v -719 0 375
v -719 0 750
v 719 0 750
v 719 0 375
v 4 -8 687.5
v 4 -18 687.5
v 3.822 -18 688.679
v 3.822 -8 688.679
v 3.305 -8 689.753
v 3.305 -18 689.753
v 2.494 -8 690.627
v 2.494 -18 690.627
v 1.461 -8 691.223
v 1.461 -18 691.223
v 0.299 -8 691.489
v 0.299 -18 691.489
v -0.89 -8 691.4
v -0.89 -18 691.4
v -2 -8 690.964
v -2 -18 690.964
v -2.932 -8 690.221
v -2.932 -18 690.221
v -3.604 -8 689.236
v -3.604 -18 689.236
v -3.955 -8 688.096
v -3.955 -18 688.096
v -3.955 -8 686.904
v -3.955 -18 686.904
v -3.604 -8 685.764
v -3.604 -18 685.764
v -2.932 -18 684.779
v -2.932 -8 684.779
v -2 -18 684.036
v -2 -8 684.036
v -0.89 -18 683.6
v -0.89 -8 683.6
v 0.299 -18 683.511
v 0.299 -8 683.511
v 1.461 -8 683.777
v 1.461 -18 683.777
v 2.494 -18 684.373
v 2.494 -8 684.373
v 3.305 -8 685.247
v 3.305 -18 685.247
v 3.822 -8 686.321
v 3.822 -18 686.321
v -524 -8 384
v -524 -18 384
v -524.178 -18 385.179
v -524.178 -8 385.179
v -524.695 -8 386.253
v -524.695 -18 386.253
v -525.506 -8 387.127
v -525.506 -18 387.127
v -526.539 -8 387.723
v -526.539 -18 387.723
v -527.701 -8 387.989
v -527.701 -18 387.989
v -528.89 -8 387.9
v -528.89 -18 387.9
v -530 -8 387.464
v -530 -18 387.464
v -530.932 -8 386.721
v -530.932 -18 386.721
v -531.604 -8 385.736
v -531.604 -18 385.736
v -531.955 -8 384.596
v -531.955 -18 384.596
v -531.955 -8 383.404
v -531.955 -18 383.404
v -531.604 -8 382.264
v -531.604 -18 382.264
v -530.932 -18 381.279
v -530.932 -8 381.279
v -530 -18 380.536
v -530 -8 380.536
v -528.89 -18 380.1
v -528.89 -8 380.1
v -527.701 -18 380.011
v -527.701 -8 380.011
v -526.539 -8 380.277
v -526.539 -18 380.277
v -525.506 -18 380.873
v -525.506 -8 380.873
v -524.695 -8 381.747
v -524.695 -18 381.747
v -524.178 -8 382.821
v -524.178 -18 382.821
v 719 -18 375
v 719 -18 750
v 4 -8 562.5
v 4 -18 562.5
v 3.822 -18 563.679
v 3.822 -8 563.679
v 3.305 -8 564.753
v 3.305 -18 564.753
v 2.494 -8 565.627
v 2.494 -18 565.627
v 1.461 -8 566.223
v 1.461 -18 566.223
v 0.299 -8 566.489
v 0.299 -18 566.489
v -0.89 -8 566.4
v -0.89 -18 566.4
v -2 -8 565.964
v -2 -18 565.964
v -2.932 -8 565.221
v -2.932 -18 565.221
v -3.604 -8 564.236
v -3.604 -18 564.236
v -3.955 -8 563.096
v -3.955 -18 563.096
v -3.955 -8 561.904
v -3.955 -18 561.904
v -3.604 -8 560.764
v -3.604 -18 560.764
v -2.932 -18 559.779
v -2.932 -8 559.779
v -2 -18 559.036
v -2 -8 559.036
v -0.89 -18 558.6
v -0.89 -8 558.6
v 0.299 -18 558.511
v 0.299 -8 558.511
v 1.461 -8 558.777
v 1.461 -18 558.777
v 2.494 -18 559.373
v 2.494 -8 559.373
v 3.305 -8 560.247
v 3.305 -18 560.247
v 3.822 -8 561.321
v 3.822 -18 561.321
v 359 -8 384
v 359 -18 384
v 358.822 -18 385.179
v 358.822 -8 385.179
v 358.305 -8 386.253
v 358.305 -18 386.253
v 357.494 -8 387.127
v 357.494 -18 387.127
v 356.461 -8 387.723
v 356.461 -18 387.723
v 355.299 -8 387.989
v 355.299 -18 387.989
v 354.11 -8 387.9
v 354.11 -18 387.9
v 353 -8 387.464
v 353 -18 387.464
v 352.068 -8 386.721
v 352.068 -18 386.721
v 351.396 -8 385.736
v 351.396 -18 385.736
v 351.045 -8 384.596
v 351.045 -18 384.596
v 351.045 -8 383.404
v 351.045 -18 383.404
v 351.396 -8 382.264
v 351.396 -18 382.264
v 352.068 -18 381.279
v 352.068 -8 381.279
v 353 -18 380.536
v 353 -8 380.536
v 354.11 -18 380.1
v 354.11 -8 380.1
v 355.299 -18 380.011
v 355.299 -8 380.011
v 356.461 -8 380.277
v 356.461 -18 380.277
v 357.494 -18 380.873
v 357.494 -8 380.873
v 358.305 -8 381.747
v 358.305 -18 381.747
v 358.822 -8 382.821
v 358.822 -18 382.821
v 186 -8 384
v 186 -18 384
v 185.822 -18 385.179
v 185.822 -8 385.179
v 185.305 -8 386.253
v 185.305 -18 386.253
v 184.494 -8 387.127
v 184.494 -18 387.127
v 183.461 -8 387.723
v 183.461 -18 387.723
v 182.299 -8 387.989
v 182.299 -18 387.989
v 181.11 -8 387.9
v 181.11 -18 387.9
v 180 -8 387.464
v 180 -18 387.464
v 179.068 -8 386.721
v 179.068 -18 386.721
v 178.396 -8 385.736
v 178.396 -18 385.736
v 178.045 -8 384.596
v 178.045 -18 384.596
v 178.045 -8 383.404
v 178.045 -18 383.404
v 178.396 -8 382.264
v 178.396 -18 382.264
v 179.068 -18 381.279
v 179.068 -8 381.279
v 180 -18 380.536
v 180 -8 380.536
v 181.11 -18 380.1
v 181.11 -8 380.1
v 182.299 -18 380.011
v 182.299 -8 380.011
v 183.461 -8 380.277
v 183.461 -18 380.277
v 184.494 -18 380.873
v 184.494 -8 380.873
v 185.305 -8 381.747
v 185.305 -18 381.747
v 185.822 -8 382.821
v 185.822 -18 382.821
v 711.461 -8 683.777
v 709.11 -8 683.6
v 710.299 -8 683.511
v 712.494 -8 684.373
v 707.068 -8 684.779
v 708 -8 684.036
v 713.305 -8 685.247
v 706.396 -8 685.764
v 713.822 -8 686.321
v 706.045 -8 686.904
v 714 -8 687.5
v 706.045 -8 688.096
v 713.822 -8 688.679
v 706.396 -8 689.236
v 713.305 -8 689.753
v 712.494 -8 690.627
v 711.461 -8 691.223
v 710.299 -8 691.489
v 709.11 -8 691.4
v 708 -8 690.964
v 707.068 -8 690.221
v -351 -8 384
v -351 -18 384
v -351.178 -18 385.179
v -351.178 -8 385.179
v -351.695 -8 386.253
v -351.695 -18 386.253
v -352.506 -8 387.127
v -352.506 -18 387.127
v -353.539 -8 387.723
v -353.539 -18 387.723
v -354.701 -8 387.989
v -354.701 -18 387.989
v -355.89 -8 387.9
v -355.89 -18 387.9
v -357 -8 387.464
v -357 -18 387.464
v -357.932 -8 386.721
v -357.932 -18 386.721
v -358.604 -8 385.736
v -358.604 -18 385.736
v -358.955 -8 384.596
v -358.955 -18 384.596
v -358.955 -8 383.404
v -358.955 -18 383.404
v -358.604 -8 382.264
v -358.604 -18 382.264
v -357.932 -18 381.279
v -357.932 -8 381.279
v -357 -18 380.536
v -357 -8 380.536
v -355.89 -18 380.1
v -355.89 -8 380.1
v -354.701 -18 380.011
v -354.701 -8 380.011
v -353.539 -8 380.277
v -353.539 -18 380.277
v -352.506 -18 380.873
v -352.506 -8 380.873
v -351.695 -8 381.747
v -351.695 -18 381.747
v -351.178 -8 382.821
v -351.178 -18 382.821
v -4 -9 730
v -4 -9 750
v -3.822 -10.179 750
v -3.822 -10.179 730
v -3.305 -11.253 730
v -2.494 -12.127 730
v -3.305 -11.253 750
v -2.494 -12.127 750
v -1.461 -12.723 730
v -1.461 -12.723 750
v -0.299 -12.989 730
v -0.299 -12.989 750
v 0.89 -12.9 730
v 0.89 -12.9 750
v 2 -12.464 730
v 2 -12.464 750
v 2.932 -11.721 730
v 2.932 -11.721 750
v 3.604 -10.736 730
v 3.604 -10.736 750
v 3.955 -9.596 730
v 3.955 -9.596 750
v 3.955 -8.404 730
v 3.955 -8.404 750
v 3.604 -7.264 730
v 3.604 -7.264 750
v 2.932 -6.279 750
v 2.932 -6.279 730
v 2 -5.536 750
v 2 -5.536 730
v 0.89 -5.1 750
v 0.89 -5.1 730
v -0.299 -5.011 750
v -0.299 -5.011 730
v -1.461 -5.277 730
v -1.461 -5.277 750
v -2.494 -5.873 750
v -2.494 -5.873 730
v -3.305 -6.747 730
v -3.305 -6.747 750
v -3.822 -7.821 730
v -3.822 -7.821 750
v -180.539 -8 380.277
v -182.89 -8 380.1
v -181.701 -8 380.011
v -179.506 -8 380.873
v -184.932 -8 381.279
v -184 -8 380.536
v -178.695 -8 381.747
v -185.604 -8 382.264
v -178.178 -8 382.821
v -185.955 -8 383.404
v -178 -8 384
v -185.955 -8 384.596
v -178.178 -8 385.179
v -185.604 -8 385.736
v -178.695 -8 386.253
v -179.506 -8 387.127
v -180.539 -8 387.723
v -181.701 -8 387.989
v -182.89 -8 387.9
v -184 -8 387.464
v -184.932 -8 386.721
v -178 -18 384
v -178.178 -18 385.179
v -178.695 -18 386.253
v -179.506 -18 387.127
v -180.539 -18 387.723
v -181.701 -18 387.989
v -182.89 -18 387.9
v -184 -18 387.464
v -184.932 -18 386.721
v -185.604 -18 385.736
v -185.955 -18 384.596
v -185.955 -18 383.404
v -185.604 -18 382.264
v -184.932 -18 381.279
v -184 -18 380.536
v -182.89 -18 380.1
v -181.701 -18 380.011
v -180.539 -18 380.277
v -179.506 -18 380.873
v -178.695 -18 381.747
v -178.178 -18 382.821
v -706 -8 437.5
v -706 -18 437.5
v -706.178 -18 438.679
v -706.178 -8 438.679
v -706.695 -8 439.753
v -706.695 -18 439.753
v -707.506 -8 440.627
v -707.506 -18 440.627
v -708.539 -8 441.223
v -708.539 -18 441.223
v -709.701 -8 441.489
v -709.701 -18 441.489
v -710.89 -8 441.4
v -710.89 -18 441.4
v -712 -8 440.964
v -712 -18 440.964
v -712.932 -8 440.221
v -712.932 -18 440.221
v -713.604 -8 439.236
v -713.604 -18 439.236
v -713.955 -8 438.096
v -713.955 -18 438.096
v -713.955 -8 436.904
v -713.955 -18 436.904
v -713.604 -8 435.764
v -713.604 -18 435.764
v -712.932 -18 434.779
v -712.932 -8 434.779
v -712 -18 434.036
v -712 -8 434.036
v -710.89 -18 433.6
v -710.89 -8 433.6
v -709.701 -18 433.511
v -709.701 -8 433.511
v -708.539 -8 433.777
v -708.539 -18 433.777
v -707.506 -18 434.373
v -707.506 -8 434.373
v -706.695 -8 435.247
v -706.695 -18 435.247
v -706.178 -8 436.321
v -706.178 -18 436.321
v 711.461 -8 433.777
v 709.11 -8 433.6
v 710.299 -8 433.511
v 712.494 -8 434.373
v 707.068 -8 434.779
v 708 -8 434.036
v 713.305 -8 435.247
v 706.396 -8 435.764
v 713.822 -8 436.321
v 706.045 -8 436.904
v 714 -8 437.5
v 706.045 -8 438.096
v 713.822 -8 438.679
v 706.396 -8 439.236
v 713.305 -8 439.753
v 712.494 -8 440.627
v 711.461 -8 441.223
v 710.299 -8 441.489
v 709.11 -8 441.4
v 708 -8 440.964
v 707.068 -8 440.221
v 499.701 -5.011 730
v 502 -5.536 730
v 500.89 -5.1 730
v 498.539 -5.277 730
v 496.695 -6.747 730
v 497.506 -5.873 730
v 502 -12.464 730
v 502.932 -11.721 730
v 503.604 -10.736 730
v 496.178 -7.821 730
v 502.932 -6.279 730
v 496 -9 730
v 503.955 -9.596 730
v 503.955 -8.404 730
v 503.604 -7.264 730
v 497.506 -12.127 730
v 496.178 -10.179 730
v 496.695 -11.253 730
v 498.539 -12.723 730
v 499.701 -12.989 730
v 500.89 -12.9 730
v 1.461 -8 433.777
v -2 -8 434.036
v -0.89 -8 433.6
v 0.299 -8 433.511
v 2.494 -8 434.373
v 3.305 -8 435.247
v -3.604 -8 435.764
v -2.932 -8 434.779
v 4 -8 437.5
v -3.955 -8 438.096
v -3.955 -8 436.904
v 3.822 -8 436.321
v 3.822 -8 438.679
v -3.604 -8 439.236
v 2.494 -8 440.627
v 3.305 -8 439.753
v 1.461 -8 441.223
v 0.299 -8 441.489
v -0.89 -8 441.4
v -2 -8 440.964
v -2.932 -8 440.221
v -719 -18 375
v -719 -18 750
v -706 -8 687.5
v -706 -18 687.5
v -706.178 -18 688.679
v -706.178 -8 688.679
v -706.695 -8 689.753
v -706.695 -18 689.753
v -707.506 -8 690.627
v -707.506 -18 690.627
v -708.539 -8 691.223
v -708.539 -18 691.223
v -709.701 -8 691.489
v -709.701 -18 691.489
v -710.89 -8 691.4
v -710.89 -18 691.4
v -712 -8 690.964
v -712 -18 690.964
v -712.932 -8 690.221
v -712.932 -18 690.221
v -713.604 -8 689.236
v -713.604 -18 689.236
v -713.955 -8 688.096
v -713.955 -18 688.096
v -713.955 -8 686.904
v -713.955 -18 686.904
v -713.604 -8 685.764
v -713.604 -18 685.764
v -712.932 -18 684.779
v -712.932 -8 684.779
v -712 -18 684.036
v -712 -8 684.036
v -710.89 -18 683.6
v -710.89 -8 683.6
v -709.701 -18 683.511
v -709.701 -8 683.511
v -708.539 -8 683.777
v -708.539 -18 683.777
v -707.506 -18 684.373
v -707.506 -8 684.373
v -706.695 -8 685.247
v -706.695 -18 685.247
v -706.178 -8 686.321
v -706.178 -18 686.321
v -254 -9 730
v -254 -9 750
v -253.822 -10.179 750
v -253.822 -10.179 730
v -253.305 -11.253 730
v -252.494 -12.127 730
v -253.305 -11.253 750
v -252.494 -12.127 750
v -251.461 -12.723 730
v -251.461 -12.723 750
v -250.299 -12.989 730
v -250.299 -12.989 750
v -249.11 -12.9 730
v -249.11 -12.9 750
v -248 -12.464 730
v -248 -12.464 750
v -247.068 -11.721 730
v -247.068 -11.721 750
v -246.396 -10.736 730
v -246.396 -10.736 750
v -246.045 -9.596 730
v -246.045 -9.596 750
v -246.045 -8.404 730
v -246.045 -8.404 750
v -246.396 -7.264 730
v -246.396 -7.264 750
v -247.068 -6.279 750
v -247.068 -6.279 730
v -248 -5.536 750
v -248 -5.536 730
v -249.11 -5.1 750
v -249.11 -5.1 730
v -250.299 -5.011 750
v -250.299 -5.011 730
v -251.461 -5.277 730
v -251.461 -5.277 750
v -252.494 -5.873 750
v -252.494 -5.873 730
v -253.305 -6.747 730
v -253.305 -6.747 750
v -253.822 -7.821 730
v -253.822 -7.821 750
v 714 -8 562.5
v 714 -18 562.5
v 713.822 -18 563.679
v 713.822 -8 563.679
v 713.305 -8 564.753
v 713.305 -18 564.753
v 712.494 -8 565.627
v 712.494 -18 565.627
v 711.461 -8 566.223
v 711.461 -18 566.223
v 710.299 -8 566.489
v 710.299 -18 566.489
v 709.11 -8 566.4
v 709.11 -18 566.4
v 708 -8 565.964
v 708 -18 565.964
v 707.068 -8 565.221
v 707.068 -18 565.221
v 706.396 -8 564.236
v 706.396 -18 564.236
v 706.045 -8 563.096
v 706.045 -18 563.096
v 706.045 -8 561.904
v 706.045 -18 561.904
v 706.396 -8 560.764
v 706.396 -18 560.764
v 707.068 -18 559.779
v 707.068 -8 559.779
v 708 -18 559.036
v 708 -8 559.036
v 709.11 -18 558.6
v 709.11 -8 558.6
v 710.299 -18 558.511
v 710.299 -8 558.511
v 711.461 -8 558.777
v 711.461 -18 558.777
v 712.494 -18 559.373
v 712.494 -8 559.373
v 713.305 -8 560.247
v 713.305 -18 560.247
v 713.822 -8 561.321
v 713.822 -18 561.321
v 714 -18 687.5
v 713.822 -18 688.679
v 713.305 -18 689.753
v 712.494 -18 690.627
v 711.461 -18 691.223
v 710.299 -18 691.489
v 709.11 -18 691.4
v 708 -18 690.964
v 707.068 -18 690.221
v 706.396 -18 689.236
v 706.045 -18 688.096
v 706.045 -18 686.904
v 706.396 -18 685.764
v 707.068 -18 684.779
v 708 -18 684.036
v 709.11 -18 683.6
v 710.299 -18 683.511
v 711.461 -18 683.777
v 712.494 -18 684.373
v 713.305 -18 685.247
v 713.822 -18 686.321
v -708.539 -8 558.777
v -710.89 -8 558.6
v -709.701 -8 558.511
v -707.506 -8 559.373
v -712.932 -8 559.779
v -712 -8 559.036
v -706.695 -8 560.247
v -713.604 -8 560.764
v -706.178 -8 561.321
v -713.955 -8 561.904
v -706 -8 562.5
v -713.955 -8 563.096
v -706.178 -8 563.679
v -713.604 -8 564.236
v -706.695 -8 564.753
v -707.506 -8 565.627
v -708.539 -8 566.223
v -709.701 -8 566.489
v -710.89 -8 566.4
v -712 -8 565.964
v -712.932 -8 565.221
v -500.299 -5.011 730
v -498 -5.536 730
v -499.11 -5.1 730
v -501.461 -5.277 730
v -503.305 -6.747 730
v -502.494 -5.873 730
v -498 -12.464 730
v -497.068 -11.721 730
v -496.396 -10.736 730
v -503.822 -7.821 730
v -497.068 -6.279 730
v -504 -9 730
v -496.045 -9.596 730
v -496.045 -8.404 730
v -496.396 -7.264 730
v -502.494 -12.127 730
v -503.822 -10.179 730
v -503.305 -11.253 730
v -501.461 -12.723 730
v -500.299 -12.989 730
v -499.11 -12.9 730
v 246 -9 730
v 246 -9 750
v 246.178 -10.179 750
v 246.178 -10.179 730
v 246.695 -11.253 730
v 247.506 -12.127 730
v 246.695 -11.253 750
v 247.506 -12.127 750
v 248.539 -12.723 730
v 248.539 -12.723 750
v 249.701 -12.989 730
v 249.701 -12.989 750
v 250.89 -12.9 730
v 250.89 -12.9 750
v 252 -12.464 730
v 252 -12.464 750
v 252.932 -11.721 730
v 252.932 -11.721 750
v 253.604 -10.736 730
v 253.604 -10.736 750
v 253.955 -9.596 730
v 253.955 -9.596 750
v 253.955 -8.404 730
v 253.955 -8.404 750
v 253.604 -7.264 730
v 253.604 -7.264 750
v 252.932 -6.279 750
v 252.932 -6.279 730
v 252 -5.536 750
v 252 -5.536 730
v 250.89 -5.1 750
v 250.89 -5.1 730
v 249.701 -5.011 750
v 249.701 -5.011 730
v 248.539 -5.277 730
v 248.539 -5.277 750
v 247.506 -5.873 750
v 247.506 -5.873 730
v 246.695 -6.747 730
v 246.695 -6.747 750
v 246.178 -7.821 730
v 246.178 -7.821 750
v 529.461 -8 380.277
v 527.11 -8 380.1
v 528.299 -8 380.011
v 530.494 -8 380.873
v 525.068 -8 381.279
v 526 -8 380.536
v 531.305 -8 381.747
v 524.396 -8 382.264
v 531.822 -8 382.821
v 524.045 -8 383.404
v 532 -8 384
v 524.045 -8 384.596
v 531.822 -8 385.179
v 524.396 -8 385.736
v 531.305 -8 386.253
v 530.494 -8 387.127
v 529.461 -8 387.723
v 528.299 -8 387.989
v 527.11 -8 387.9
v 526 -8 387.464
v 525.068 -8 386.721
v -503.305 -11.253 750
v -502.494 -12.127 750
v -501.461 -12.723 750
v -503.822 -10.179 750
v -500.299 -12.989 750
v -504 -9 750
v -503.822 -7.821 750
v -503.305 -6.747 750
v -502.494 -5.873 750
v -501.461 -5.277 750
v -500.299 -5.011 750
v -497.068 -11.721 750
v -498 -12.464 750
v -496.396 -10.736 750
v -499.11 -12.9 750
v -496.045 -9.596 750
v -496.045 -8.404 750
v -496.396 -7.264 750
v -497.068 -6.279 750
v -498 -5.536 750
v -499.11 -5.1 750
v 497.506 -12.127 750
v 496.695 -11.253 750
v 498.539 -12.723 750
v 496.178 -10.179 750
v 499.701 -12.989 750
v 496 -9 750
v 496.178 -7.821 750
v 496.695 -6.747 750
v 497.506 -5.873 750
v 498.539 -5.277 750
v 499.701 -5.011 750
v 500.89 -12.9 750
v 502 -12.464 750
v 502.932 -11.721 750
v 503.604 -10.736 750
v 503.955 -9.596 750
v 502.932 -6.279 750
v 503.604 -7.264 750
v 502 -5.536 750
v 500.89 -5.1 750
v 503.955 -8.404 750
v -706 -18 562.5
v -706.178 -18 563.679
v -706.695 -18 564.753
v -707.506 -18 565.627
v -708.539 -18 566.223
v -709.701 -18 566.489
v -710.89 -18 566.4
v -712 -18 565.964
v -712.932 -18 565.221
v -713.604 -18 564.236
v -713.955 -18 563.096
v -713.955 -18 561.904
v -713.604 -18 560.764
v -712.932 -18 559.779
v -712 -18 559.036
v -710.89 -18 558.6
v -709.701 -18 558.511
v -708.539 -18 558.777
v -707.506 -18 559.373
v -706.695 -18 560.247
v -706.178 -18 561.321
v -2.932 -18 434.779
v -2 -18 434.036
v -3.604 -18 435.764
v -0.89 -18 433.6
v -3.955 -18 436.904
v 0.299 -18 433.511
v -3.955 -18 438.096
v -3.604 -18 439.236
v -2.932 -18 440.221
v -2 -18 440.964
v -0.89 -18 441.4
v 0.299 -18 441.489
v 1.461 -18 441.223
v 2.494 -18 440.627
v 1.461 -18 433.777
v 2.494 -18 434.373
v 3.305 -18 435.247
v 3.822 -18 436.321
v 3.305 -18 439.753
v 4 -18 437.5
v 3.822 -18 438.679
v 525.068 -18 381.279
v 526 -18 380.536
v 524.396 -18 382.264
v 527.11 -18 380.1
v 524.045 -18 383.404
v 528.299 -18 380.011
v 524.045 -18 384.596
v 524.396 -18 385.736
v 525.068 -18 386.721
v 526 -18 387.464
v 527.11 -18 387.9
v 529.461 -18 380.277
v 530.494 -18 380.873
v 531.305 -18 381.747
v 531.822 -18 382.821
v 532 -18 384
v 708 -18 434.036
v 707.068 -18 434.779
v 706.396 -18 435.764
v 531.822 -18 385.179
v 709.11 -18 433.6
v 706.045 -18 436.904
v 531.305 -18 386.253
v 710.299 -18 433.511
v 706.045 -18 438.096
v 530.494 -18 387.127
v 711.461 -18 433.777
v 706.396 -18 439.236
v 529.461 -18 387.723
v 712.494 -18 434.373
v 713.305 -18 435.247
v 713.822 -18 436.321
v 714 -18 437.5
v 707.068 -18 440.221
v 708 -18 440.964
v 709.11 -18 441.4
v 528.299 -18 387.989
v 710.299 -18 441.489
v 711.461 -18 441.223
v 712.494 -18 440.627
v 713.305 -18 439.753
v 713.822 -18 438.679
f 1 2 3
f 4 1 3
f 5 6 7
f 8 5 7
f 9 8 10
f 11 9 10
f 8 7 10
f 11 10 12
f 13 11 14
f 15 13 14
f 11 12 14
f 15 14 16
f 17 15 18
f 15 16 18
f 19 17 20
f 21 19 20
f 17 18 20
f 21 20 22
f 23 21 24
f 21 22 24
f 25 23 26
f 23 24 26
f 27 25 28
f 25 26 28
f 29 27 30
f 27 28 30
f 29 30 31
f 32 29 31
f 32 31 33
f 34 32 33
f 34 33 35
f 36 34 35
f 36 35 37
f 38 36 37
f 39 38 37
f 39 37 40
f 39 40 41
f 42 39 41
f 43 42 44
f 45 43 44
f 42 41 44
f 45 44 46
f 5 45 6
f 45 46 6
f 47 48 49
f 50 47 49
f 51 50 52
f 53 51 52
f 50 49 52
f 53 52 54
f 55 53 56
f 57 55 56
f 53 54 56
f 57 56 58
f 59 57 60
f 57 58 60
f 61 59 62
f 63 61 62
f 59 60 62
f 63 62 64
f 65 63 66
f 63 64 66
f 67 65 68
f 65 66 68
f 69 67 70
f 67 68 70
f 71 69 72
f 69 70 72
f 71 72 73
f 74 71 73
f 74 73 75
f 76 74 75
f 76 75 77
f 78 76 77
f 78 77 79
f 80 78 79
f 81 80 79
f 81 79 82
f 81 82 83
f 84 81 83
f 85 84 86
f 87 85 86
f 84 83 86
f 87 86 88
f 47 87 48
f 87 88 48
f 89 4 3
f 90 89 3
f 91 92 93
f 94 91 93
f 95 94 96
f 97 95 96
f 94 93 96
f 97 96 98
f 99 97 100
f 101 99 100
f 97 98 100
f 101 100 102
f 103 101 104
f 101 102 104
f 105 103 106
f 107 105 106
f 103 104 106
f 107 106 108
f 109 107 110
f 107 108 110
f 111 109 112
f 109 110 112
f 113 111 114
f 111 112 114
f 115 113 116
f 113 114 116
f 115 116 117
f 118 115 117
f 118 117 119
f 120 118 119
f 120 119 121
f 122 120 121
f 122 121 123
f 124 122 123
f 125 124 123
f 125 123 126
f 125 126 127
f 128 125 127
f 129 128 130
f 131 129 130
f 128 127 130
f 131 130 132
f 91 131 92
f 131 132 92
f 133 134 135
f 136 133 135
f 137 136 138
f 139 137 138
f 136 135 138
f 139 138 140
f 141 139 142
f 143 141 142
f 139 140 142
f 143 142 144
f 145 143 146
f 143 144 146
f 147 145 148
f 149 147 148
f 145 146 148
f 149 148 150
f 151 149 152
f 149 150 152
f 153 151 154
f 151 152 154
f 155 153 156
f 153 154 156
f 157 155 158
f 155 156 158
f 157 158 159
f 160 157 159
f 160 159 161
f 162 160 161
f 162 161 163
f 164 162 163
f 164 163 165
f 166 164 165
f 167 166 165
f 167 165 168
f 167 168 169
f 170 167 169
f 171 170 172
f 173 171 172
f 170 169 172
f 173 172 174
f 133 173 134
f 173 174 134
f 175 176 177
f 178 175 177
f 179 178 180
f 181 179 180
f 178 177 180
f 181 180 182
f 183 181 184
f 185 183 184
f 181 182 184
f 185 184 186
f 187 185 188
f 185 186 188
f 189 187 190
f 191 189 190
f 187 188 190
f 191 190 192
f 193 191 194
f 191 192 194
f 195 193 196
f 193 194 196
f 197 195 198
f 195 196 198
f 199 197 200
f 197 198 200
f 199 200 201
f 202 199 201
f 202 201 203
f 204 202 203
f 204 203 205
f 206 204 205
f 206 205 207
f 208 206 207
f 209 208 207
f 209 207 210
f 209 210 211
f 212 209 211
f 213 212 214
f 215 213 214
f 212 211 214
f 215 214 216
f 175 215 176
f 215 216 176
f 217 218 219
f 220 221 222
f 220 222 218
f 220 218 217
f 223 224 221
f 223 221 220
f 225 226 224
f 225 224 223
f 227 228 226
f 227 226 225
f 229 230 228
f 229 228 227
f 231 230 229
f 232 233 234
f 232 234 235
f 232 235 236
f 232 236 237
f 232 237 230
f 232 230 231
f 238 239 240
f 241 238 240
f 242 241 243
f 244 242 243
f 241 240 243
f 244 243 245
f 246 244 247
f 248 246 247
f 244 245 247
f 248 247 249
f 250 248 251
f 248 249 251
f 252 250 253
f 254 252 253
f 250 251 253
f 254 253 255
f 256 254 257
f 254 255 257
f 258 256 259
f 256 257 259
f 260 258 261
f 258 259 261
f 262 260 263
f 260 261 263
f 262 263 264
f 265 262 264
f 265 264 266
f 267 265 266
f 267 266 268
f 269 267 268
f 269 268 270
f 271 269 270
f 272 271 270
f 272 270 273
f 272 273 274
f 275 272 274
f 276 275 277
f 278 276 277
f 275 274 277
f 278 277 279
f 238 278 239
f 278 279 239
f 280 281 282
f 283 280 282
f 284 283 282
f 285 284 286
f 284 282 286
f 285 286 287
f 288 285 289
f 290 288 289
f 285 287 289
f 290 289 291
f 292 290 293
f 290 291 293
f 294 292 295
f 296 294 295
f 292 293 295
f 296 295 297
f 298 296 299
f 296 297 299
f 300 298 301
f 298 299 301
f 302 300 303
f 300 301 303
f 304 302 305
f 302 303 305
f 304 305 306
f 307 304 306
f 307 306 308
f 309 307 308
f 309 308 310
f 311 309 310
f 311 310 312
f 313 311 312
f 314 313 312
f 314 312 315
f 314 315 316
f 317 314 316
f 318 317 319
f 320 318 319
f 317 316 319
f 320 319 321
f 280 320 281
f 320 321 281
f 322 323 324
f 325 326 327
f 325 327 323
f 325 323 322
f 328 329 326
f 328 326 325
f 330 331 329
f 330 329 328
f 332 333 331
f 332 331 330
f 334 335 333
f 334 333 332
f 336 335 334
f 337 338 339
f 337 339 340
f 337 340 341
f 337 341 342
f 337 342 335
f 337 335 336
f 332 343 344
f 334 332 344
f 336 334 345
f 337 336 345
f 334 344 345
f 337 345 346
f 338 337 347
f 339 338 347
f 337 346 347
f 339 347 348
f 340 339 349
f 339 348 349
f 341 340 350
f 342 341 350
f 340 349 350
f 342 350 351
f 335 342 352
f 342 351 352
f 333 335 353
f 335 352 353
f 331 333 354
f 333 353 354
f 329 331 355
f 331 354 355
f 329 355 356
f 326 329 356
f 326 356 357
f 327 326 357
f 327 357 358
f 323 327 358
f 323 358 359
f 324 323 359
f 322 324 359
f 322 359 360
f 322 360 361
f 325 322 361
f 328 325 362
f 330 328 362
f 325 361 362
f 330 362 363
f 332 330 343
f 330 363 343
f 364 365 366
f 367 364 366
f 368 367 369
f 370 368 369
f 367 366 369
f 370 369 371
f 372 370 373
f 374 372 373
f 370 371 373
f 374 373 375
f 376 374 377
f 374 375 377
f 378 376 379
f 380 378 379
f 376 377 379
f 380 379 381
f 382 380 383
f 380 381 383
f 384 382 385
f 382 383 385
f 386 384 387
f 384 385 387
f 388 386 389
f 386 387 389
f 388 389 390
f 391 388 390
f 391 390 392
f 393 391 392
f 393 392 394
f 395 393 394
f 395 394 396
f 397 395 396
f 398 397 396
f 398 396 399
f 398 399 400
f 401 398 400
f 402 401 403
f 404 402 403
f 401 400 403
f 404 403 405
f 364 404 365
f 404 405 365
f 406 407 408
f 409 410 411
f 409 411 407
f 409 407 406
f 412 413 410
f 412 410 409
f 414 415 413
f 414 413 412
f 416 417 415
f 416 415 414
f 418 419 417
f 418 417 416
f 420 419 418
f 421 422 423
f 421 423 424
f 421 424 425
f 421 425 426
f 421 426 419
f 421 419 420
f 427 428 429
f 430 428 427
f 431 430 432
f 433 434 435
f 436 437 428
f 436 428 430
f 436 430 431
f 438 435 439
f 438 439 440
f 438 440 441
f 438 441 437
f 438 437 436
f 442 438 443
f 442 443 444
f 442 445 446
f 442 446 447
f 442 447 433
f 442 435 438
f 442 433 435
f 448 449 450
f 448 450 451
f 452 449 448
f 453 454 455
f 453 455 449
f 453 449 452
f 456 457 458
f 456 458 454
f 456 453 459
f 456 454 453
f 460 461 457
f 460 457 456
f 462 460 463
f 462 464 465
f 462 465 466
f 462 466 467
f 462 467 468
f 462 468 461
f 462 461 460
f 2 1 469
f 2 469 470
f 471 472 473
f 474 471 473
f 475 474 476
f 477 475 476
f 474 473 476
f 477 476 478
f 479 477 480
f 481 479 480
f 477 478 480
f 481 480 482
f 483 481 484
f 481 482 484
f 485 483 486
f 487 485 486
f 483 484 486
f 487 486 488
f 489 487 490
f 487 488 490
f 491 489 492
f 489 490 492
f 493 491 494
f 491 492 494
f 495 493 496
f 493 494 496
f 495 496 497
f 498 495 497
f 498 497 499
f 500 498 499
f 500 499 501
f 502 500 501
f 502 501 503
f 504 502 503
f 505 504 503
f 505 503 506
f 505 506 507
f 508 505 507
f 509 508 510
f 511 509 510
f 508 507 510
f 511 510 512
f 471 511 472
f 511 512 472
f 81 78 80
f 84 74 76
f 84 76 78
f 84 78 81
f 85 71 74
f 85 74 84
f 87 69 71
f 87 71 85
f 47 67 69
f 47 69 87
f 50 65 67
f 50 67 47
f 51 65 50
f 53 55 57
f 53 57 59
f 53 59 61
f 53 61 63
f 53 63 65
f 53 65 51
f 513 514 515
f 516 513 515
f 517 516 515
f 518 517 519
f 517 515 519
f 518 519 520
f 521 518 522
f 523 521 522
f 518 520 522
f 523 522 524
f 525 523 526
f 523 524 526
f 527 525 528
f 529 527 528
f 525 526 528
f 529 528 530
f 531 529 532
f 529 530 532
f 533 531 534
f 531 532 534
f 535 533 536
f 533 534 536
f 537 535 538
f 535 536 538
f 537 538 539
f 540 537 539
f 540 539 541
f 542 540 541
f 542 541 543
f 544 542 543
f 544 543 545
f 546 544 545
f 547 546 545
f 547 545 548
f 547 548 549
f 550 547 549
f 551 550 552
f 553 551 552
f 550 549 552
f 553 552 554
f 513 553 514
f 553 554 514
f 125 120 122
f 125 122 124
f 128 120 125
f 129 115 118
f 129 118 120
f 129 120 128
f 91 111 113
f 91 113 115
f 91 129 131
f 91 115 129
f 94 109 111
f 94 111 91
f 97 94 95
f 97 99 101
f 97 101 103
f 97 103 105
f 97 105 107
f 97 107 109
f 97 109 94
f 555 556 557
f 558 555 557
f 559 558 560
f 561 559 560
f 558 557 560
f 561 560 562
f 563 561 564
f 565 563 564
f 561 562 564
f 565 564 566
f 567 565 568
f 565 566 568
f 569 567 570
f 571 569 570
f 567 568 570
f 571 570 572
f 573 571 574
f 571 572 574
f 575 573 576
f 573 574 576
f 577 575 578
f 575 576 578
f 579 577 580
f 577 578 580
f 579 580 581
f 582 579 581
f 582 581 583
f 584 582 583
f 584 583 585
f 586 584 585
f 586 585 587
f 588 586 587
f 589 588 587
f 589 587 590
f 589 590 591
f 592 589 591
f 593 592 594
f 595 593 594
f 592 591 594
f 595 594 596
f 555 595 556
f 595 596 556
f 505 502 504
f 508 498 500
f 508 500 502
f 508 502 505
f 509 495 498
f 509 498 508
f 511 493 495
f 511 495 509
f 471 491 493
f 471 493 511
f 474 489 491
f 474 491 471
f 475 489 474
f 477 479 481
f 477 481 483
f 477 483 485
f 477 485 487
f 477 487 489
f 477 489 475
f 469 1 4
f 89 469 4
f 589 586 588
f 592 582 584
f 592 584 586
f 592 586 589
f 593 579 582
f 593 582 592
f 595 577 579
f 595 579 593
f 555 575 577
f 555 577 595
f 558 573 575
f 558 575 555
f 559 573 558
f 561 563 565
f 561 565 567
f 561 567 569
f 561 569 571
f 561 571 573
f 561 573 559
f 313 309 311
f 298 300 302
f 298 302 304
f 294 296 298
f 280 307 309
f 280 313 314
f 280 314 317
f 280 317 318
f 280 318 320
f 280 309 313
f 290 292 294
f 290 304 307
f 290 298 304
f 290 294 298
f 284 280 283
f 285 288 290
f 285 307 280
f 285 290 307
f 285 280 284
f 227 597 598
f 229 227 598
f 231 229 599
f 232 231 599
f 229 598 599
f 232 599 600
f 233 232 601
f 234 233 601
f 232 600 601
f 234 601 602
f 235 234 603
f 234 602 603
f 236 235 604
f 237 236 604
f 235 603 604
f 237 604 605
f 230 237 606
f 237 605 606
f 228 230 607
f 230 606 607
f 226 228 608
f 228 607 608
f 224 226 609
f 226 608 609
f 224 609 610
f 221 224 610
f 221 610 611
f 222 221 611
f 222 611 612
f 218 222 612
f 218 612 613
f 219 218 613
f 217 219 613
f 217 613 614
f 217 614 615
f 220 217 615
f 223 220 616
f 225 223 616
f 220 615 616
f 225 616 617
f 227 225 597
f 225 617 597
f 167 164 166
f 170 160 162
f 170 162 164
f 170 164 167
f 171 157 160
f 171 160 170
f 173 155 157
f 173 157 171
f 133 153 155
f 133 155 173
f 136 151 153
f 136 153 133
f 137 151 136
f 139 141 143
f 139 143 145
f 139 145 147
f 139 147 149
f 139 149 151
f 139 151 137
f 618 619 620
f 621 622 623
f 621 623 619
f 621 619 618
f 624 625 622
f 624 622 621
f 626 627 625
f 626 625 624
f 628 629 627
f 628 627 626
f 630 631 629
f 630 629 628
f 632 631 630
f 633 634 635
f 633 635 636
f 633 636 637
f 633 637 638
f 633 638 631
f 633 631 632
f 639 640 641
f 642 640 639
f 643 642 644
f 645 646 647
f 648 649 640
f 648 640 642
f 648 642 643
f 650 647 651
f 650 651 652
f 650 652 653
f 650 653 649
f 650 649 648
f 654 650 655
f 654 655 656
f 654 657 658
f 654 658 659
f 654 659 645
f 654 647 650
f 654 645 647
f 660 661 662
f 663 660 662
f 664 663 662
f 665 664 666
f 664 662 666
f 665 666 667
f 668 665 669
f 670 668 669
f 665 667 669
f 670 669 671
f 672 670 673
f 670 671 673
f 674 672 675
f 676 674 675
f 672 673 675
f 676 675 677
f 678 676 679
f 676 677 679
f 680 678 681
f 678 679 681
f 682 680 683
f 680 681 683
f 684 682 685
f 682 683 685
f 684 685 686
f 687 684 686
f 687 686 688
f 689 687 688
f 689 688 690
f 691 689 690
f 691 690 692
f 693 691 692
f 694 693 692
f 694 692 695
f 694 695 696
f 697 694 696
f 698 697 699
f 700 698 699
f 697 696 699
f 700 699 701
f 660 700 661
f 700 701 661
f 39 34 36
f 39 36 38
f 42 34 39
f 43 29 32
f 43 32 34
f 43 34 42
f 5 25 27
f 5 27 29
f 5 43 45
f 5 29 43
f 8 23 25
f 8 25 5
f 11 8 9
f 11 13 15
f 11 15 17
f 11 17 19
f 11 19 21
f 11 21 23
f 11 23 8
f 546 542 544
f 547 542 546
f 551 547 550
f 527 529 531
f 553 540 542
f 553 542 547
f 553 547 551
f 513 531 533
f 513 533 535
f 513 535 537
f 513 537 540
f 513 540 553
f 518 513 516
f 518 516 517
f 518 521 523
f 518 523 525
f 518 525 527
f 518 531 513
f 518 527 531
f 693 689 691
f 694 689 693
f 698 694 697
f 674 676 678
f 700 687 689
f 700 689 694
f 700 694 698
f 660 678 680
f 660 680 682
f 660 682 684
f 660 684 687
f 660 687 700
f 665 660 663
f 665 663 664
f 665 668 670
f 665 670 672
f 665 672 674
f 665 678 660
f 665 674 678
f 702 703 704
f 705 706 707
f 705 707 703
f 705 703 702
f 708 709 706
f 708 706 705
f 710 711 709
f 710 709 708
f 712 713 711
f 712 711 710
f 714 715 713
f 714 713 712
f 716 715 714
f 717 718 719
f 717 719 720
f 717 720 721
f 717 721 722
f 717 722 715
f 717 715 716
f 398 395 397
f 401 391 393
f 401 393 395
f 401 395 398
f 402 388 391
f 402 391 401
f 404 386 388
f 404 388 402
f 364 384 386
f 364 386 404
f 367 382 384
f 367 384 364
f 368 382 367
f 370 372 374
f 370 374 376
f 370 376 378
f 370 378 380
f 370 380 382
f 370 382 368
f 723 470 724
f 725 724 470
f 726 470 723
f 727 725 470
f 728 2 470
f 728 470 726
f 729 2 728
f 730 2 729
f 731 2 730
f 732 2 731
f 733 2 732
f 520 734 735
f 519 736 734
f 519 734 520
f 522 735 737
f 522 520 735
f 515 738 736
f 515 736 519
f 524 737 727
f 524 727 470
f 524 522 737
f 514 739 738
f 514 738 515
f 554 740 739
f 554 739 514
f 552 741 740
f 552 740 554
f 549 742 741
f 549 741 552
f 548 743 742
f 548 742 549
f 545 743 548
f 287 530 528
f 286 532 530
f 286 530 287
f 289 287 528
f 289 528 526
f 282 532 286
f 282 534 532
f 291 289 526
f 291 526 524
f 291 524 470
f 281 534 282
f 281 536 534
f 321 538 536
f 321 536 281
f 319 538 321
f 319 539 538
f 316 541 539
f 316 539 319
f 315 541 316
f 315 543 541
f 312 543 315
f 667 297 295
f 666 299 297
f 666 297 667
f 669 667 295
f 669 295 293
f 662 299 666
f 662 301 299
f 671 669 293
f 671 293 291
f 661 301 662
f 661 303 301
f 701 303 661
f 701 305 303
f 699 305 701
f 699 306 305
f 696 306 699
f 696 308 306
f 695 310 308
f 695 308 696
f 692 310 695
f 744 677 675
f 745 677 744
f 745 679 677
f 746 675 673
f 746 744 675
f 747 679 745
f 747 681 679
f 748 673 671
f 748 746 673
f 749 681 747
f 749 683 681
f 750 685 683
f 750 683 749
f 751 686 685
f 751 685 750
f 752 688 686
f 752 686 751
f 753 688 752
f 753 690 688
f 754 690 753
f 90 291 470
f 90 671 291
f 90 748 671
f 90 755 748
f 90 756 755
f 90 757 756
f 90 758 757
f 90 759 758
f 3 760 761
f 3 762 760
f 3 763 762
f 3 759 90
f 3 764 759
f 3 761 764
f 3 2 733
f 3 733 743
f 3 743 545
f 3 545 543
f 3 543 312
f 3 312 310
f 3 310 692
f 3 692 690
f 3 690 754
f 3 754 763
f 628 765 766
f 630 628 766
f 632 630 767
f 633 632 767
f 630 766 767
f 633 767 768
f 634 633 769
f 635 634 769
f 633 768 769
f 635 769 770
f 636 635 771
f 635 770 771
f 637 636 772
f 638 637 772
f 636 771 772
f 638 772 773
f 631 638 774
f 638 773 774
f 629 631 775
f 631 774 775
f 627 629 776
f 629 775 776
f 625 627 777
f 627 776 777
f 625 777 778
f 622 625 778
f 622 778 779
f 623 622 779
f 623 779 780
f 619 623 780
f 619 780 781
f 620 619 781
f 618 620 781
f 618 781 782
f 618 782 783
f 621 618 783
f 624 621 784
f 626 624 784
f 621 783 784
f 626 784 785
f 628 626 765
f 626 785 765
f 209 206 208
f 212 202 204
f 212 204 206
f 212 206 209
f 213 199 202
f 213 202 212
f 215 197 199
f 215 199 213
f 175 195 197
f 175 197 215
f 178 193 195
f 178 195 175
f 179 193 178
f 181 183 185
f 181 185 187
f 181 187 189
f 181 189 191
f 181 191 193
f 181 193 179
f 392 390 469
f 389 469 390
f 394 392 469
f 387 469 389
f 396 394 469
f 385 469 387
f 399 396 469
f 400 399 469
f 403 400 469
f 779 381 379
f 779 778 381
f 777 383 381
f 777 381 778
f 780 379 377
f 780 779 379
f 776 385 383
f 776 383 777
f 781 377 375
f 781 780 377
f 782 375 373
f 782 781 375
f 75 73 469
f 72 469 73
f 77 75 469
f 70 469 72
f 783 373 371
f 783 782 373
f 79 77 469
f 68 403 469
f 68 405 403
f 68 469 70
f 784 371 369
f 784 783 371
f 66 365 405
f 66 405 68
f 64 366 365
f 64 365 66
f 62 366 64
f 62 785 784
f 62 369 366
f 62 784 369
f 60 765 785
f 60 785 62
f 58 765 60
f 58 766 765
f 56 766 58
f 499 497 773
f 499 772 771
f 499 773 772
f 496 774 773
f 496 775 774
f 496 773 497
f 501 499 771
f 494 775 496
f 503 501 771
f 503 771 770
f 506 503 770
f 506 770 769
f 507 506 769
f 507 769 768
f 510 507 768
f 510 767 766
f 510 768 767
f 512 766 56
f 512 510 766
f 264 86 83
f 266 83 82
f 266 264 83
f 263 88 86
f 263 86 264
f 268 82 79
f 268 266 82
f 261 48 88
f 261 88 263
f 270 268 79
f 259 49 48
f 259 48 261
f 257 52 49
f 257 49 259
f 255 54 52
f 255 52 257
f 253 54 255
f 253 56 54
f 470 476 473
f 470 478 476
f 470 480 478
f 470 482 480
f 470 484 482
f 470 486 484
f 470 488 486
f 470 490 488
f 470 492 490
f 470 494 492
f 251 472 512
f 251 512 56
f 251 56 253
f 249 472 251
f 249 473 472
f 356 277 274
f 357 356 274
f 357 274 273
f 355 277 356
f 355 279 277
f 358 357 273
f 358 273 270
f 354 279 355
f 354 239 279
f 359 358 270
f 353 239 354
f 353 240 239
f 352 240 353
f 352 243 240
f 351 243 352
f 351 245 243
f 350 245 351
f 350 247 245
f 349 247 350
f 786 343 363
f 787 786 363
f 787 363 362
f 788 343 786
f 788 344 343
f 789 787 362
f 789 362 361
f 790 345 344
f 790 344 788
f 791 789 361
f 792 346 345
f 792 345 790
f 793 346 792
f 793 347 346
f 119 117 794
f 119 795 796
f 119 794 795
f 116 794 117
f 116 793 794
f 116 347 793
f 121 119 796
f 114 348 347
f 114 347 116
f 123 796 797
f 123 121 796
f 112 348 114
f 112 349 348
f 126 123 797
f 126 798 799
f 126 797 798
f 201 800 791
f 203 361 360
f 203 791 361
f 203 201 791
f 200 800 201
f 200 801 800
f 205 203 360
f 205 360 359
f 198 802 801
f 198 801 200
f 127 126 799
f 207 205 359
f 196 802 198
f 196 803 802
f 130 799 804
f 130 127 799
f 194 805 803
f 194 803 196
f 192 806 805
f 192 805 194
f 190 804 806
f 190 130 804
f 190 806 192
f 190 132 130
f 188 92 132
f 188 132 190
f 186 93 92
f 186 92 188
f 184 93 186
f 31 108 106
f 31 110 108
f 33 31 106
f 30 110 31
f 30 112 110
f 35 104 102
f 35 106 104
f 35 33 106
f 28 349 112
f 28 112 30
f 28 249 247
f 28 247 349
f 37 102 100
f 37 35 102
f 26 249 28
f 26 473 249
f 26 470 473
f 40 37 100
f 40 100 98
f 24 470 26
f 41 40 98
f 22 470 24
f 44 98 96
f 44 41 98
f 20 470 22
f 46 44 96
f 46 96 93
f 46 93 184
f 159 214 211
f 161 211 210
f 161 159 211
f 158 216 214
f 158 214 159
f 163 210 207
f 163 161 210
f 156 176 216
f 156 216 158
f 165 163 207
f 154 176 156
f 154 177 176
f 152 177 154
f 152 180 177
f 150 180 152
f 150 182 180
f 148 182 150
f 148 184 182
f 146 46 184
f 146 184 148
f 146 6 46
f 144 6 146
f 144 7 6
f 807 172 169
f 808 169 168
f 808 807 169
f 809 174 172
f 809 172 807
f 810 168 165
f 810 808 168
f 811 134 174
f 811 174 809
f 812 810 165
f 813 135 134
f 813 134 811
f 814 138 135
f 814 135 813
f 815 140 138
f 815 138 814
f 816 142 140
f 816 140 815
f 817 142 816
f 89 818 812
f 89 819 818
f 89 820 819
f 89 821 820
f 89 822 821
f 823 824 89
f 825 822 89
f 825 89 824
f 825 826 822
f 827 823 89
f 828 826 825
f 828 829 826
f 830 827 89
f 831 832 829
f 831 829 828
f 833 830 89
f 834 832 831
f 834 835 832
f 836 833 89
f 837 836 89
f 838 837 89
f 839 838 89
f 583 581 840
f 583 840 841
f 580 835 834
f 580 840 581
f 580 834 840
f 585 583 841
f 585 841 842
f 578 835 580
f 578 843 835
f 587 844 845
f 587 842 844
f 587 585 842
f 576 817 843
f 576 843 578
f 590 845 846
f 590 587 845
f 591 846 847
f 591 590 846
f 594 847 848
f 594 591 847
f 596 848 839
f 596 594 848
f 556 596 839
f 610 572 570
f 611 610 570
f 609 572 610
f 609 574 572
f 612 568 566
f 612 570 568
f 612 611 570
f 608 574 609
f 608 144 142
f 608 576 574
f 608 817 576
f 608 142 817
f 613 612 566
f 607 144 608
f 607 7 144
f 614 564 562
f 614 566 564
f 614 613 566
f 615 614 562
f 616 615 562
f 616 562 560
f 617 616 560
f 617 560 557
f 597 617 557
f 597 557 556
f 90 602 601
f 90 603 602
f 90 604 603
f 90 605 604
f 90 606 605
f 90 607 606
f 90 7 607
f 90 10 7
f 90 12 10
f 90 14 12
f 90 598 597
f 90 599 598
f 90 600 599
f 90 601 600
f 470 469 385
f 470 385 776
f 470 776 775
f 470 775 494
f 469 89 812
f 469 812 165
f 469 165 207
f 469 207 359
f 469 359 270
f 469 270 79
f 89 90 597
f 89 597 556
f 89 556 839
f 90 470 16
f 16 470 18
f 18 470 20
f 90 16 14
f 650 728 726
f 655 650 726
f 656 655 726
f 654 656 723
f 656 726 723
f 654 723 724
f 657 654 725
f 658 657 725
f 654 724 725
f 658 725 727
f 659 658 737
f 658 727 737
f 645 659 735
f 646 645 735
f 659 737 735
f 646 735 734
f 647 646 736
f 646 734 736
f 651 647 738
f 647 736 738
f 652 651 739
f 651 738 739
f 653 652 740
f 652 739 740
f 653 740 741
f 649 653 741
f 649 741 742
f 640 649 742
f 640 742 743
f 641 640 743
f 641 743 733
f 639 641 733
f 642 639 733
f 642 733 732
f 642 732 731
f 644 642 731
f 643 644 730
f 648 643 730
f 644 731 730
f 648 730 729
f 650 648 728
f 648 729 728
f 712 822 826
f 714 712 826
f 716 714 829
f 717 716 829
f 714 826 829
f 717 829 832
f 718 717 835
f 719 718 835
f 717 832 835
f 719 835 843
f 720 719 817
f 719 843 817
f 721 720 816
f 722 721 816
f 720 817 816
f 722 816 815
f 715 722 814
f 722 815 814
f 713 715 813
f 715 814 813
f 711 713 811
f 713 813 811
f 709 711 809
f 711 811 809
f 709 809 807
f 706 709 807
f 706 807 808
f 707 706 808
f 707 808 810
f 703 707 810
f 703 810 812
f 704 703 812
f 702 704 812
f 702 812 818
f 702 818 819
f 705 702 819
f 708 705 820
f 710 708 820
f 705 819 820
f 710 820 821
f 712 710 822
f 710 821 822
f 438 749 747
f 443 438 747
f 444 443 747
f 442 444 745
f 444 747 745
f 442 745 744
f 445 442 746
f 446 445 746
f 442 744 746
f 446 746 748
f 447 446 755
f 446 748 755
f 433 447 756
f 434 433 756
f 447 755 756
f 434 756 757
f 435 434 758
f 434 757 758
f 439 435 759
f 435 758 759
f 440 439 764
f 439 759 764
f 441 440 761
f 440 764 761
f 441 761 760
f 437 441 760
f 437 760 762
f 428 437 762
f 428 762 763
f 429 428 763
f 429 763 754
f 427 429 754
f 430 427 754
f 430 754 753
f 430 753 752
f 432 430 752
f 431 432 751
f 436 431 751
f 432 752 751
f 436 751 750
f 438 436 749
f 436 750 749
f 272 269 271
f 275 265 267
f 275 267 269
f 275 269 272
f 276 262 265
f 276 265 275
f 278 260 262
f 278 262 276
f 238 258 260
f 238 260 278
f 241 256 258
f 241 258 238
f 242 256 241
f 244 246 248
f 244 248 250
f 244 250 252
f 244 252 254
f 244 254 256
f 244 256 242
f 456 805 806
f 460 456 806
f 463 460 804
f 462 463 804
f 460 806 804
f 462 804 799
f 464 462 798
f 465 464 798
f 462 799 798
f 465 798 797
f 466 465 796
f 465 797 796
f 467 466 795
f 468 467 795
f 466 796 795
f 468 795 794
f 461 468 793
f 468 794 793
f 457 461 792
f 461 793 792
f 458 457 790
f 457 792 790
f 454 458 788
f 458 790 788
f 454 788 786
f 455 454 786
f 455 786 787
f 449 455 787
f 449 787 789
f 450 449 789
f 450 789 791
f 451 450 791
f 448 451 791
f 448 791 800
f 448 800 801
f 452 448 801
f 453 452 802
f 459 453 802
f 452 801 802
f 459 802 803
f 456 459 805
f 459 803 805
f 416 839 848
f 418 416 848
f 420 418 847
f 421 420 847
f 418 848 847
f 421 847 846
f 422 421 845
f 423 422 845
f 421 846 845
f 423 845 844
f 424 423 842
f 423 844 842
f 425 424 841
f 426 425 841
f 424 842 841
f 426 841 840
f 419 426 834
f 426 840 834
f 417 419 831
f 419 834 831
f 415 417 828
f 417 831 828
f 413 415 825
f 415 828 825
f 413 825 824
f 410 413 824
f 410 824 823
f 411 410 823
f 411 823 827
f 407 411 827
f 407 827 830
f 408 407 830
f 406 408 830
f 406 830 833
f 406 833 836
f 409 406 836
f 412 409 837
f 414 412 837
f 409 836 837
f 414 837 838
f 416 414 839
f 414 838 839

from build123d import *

# Parameters (mm, degrees)
SKETCH068_W     = 1438
SKETCH068_H     = 375
PAD026_DEPTH    = 18
SKETCH075_R     = 4
POCKET026_DEPTH = 10
SKETCH076_R     = 4
POCKET_DEPTH    = 20


with BuildPart() as part:
    # Sketch068 → Pad026 (new body)
    with BuildSketch(Plane.XZ):
        with Locations((0, 562.5)):
            Rectangle(SKETCH068_W, SKETCH068_H)
    extrude(amount=PAD026_DEPTH)

    # Sketch075 (on Face6 of Pad026) → Pocket026 (cut)
    with BuildSketch(Plane.XZ.offset(18)):
        with Locations((-710, 687.5)):
            Circle(SKETCH075_R)
        with Locations((-710, 562.5)):
            Circle(SKETCH075_R)
        with Locations((-710, 437.5)):
            Circle(SKETCH075_R)
        with Locations((0, 562.5)):
            Circle(SKETCH075_R)
        with Locations((0, 687.5)):
            Circle(SKETCH075_R)
        with Locations((0, 437.5)):
            Circle(SKETCH075_R)
        with Locations((710, 687.5)):
            Circle(SKETCH075_R)
        with Locations((710, 562.5)):
            Circle(SKETCH075_R)
        with Locations((710, 437.5)):
            Circle(SKETCH075_R)
        with Locations((182, 384)):
            Circle(SKETCH075_R)
        with Locations((355, 384)):
            Circle(SKETCH075_R)
        with Locations((528, 384)):
            Circle(SKETCH075_R)
        with Locations((-528, 384)):
            Circle(SKETCH075_R)
        with Locations((-355, 384)):
            Circle(SKETCH075_R)
        with Locations((-182, 384)):
            Circle(SKETCH075_R)
    extrude(amount=-POCKET026_DEPTH, mode=Mode.SUBTRACT)

    # Sketch076 (on Face1 of Pocket026) → Pocket (cut)
    with BuildSketch(Plane(origin=(0, 0, 750), x_dir=(-1, 0, 0), z_dir=(0, 0, 1))):
        with Locations((0, 9)):
            Circle(SKETCH076_R)
        with Locations((-250, 9)):
            Circle(SKETCH076_R)
        with Locations((-500, 9)):
            Circle(SKETCH076_R)
        with Locations((250, 9)):
            Circle(SKETCH076_R)
        with Locations((500, 9)):
            Circle(SKETCH076_R)
    extrude(amount=-POCKET_DEPTH, mode=Mode.SUBTRACT)


solid = part.part
